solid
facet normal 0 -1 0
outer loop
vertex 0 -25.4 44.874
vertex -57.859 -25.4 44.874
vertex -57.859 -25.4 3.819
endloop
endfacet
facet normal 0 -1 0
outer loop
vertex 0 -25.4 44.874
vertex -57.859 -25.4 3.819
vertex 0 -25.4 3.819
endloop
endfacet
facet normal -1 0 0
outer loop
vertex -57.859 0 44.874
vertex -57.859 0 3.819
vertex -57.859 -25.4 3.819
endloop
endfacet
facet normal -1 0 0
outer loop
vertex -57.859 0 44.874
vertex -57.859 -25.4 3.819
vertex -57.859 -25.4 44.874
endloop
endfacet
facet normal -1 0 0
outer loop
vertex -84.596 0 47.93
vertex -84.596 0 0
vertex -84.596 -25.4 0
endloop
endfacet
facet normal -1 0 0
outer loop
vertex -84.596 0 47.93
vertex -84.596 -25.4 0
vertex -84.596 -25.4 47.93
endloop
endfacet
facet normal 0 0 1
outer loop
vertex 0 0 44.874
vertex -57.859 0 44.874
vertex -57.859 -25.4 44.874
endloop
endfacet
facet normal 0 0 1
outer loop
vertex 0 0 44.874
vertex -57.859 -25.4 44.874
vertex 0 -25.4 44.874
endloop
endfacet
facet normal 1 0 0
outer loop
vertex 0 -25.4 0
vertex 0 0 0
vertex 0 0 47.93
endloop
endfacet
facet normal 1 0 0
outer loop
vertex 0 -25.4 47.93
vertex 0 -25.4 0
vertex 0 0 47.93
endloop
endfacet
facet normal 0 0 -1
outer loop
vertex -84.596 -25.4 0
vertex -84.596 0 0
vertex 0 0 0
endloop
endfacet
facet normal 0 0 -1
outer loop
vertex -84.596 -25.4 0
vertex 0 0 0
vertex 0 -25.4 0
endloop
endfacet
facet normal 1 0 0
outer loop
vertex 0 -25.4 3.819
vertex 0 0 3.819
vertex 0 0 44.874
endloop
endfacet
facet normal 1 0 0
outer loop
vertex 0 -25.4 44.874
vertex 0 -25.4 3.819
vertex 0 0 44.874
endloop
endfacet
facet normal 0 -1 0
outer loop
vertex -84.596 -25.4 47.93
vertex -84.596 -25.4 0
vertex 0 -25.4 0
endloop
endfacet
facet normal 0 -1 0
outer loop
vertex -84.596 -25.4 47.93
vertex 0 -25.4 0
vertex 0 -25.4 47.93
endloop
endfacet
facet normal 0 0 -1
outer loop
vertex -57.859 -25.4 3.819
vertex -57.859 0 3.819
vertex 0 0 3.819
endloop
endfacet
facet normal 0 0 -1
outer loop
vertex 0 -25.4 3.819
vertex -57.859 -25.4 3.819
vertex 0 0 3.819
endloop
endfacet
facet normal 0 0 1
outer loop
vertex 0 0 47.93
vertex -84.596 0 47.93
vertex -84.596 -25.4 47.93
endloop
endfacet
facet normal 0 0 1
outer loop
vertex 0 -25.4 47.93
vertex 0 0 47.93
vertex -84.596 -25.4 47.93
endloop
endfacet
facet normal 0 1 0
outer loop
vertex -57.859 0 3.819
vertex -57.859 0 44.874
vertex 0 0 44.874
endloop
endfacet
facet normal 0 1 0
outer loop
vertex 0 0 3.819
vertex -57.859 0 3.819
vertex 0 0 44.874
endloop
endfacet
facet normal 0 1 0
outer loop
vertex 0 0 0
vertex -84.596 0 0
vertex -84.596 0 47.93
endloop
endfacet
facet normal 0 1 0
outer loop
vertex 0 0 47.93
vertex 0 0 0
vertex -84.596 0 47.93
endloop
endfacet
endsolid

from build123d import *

# Parameters (mm, degrees)
F1_W     = 57.8592605889
F1_H     = 41.0552509129
F2_DEPTH = 25.4
F0_W     = 59.1959431767
F0_H     = 47.9296185076
F3_DEPTH = 25.4


with BuildPart() as f2:
    # F1 (on face) → F2 (new body)
    with BuildSketch(Plane.XZ):
        with Locations((-28.9296302944, 24.3467185646)):
            Rectangle(F1_W, F1_H)
    extrude(amount=F2_DEPTH)


with BuildPart() as f2b:
    # F0 (on Front) → F2, piece 2 (new body)
    with BuildSketch(Plane.XZ):
        with Locations((-29.5979715884, 23.9648092538)):
            Rectangle(F0_W, F0_H)
    extrude(amount=F2_DEPTH)

    # F3 (add): a face of the model
    f3_faces = [f2b.faces().sort_by_distance(p)[0] for p in [
        (-59.1959431767, -12.7, 23.9648092538),
    ]]
    extrude(f3_faces, amount=F3_DEPTH)


solid = Compound([f2.part, f2b.part])
